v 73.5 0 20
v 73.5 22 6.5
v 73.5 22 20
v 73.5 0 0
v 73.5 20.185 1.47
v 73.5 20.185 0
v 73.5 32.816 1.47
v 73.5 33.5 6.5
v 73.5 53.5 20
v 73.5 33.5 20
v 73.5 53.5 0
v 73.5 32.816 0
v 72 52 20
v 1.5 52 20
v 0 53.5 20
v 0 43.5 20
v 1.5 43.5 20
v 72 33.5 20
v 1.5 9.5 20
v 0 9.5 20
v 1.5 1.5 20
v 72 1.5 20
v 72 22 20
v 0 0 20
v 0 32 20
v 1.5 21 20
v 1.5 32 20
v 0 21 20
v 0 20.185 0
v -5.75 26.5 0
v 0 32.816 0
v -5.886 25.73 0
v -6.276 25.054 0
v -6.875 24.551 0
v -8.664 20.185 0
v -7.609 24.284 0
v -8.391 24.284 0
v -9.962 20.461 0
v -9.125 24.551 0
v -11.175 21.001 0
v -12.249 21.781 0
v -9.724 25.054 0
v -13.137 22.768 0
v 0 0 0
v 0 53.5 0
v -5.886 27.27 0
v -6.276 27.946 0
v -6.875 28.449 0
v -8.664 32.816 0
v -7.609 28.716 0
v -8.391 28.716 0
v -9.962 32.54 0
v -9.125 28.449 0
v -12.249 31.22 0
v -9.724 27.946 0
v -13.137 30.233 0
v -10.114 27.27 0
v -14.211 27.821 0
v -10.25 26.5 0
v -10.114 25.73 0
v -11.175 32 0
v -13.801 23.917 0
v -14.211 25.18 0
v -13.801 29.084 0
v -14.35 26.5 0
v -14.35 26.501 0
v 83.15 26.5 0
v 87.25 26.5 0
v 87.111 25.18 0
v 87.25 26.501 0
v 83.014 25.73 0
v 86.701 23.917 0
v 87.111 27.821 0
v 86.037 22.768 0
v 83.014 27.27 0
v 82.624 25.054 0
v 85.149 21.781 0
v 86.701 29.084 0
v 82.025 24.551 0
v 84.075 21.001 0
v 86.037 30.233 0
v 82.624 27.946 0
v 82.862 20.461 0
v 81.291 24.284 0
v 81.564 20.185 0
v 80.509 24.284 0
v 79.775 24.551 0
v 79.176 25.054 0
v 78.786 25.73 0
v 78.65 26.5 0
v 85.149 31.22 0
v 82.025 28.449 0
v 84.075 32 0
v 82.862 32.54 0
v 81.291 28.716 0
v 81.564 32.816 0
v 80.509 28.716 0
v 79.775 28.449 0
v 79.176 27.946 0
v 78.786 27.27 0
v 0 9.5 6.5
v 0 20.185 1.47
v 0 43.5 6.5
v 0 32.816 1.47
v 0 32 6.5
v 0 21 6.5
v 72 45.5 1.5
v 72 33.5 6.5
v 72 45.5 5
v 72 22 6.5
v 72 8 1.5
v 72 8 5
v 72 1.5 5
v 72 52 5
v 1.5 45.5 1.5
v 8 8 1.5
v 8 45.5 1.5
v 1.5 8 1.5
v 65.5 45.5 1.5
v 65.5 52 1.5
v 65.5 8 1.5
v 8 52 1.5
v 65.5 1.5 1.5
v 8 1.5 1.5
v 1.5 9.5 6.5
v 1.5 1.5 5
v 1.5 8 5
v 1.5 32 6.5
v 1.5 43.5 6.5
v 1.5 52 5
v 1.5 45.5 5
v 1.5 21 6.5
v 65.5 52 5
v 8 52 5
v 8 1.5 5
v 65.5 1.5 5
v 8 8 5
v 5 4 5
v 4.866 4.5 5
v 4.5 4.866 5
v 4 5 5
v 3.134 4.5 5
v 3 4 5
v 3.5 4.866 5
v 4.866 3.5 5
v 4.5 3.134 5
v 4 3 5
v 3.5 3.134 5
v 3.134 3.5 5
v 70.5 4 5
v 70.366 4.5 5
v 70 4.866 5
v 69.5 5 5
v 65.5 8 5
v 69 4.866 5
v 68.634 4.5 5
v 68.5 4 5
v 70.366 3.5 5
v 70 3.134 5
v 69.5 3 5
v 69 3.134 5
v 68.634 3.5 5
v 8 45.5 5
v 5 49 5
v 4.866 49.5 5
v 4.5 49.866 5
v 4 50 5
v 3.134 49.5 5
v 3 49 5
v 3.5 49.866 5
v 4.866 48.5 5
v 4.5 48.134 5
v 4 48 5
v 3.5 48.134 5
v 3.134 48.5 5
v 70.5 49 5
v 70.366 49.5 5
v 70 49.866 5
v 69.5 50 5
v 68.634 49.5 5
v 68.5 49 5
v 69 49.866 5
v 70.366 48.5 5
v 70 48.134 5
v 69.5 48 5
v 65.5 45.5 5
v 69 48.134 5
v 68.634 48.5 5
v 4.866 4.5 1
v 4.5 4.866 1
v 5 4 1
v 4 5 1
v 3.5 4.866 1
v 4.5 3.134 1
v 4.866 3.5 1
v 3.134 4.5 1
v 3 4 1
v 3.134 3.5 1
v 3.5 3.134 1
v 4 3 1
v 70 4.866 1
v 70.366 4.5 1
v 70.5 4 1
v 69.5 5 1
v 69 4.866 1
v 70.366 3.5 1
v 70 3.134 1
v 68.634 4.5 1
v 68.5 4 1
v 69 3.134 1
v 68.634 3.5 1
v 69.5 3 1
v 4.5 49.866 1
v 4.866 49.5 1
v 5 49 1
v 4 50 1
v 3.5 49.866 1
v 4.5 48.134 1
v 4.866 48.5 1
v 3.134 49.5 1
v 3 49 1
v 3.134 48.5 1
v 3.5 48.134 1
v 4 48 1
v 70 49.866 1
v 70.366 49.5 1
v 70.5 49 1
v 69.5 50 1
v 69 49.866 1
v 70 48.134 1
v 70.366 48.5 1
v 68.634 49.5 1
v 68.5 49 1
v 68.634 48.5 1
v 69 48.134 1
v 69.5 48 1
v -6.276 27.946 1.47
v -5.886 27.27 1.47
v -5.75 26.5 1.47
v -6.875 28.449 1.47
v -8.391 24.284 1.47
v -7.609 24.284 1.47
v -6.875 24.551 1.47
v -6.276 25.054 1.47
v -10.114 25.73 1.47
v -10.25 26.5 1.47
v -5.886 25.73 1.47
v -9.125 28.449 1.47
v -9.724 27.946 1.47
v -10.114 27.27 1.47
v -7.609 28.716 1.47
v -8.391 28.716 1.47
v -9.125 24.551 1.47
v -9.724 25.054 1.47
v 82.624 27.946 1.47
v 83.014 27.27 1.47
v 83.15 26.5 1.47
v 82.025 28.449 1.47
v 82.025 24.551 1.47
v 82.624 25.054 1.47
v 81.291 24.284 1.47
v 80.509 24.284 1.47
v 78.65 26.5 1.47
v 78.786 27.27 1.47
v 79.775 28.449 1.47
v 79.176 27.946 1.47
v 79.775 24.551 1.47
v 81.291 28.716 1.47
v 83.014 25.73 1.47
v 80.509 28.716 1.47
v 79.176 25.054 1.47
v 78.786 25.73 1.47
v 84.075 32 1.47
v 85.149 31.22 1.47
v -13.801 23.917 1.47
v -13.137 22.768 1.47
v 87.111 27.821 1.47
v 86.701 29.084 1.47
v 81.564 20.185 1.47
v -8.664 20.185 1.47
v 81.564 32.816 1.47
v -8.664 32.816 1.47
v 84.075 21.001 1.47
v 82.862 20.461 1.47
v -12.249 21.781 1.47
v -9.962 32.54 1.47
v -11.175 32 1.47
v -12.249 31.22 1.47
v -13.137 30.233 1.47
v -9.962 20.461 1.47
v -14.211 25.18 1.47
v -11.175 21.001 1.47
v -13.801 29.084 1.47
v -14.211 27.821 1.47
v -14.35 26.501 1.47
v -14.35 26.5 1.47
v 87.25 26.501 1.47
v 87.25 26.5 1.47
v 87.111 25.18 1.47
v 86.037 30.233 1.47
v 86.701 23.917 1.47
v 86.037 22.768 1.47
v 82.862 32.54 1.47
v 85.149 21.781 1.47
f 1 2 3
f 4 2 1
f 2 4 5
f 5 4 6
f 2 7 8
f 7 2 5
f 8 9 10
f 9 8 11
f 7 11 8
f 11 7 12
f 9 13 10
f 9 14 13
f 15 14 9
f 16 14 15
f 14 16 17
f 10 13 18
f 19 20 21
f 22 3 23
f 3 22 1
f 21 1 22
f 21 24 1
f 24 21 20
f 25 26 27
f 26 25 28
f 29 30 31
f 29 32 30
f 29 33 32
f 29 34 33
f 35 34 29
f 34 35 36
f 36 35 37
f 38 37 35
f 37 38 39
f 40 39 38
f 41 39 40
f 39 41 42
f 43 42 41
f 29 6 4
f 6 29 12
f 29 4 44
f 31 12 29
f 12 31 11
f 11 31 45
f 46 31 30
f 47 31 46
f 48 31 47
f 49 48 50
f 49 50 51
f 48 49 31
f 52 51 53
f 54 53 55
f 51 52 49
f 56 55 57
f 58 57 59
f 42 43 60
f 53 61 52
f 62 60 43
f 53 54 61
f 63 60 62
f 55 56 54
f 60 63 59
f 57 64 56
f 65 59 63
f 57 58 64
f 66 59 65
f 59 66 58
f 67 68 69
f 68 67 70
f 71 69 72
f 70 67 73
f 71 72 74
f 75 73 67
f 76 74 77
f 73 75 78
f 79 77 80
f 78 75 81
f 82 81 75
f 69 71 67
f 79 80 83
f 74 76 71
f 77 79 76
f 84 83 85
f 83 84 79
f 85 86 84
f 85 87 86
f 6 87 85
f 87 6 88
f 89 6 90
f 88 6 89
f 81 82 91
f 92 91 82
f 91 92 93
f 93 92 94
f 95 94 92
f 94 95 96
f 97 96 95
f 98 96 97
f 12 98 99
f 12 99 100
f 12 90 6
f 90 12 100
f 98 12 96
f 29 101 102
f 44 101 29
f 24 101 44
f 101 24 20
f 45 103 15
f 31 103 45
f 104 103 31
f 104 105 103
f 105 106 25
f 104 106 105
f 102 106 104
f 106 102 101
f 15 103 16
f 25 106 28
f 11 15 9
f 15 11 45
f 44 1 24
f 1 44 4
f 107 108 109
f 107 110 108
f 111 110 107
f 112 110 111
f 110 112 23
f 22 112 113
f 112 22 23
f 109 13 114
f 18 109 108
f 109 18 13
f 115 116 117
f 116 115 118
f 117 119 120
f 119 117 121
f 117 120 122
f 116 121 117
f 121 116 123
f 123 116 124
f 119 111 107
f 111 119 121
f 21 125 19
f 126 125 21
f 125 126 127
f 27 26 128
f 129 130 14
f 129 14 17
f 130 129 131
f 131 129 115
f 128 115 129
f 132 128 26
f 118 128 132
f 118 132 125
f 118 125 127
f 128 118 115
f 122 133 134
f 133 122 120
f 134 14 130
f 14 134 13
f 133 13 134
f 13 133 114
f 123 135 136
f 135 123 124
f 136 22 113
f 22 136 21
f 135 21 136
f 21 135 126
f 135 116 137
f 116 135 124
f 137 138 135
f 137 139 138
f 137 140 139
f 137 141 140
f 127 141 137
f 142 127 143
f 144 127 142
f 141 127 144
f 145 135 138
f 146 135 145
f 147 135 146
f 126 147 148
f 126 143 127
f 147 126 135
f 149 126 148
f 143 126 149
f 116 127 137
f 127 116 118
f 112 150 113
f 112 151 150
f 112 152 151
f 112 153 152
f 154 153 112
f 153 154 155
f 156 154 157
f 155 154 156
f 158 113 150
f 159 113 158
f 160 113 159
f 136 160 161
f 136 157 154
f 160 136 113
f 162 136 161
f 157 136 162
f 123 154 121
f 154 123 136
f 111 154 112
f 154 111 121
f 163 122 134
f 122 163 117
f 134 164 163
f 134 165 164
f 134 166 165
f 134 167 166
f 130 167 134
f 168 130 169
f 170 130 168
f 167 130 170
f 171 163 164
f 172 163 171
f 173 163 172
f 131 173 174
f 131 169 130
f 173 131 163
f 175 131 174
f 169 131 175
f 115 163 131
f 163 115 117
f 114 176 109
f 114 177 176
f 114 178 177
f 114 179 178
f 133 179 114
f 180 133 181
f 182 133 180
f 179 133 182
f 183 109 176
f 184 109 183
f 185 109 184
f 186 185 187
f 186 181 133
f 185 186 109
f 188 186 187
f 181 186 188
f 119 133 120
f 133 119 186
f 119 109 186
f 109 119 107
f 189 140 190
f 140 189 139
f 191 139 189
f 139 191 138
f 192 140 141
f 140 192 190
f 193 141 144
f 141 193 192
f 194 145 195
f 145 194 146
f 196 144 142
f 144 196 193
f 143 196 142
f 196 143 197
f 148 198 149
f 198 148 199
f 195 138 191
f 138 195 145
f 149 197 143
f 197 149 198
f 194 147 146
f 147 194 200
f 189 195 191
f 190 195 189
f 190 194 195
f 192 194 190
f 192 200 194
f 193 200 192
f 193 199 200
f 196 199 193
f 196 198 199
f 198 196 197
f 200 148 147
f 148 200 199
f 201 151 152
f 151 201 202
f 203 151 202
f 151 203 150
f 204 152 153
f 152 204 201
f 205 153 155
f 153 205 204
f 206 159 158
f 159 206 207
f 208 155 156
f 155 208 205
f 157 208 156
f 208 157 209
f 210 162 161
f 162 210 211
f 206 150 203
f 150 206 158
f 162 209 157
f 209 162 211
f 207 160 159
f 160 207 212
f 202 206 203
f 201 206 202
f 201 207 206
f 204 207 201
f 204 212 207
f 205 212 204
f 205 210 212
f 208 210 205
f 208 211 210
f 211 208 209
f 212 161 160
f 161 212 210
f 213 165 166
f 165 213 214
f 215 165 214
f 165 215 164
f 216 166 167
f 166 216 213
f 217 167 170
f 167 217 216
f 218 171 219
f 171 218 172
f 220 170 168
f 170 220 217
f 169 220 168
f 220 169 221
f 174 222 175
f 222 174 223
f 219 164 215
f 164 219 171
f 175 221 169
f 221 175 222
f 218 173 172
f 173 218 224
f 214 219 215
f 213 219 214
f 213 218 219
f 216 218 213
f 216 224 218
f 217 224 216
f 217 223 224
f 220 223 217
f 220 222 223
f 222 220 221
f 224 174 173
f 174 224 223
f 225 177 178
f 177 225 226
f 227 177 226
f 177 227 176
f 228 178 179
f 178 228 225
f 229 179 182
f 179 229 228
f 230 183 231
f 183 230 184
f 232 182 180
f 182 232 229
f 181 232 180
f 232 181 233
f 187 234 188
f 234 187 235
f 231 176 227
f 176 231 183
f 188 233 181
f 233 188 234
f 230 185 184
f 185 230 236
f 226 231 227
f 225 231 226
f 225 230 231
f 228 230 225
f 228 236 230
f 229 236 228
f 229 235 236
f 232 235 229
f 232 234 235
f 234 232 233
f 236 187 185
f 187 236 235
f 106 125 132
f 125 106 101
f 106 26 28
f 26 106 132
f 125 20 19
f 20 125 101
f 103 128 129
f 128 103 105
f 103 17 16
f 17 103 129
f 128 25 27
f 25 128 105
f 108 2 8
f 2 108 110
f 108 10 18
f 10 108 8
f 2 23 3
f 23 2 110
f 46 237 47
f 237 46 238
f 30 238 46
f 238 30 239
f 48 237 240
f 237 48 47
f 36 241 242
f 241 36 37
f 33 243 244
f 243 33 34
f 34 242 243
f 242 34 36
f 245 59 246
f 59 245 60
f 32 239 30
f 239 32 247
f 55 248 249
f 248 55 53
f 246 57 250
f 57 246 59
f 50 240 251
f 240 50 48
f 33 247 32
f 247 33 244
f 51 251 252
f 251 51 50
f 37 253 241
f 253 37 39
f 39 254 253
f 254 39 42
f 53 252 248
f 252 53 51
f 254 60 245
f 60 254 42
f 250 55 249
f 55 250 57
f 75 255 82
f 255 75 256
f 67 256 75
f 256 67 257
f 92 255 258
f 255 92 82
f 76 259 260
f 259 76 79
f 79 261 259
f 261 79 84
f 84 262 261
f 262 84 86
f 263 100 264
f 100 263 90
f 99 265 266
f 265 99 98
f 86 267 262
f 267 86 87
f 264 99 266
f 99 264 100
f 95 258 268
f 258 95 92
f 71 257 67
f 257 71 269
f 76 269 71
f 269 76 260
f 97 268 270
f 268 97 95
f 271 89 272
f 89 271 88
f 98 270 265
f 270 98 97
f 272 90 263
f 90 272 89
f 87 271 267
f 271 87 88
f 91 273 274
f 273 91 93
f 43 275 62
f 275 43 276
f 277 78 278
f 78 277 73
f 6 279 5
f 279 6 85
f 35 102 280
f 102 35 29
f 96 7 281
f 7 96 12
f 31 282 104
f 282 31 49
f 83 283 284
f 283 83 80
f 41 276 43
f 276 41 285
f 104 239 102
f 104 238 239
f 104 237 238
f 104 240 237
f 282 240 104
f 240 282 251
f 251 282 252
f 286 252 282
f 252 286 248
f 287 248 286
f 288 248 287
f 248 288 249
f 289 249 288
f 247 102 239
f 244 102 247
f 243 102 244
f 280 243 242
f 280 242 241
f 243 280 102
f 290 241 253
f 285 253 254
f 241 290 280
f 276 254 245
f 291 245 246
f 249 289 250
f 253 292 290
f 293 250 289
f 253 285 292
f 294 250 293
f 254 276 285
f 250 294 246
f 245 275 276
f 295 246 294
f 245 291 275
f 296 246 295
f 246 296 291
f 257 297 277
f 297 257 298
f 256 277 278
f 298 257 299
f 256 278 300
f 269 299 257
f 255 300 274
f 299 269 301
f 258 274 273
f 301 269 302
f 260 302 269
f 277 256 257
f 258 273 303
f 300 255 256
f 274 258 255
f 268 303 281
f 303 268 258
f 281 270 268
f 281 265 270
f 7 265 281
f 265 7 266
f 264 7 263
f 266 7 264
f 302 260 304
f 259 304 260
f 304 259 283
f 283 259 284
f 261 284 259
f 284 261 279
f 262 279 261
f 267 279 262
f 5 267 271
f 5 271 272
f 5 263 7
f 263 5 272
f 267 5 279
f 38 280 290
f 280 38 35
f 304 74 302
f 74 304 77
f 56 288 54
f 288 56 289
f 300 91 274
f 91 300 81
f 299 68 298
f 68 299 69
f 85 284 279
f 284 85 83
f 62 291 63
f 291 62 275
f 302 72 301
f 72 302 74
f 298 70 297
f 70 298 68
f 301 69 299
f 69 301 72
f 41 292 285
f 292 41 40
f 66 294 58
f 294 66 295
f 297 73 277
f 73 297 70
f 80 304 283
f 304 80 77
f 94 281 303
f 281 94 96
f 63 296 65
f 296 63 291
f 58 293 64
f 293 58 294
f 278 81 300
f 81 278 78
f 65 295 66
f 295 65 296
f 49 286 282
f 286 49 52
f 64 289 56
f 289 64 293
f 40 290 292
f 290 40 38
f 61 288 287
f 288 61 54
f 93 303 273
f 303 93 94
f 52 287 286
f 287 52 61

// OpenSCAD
difference(){
union(){
difference(){
    cube([73.5,53.5,20]);
    translate([1.5,1.5,1.5])cube([70.5,50.5,20]);
}

translate([0,0,0])cube([8,8,5]);
translate([65.5,0,0])cube([8,8,5]);
translate([0,45.5,0])cube([8,8,5]);
translate([65.5,45.5,0])cube([8,8,5]);
}
translate([4,4,1])cylinder(d=2,h=5,$fn=12);
translate([69.5,4,1])cylinder(d=2,h=5,$fn=12);
translate([4,49,1])cylinder(d=2,h=5,$fn=12);
translate([69.5,49,1])cylinder(d=2,h=5,$fn=12);

translate([-1,9.5,6.5])cube([5,11.5,20]);
translate([-1,32,6.5])cube([5,11.5,20]);
translate([72,22,6.5])cube([5,11.5,20]);
}

scale([1,1,0.49])translate([-8,26.5,0])meccano(8);

module meccano(n=2){
difference(){
    minkowski(){
        cylinder(d=12.7,h=3,$fn=30);
        cube([(n-1)*12.7,.001,0.001]);
    }
    for (i=[0:n-1]){
        translate([i*12.7,0,-1])cylinder(d=4.5,h=5,$fn=18);
    }
}
}
